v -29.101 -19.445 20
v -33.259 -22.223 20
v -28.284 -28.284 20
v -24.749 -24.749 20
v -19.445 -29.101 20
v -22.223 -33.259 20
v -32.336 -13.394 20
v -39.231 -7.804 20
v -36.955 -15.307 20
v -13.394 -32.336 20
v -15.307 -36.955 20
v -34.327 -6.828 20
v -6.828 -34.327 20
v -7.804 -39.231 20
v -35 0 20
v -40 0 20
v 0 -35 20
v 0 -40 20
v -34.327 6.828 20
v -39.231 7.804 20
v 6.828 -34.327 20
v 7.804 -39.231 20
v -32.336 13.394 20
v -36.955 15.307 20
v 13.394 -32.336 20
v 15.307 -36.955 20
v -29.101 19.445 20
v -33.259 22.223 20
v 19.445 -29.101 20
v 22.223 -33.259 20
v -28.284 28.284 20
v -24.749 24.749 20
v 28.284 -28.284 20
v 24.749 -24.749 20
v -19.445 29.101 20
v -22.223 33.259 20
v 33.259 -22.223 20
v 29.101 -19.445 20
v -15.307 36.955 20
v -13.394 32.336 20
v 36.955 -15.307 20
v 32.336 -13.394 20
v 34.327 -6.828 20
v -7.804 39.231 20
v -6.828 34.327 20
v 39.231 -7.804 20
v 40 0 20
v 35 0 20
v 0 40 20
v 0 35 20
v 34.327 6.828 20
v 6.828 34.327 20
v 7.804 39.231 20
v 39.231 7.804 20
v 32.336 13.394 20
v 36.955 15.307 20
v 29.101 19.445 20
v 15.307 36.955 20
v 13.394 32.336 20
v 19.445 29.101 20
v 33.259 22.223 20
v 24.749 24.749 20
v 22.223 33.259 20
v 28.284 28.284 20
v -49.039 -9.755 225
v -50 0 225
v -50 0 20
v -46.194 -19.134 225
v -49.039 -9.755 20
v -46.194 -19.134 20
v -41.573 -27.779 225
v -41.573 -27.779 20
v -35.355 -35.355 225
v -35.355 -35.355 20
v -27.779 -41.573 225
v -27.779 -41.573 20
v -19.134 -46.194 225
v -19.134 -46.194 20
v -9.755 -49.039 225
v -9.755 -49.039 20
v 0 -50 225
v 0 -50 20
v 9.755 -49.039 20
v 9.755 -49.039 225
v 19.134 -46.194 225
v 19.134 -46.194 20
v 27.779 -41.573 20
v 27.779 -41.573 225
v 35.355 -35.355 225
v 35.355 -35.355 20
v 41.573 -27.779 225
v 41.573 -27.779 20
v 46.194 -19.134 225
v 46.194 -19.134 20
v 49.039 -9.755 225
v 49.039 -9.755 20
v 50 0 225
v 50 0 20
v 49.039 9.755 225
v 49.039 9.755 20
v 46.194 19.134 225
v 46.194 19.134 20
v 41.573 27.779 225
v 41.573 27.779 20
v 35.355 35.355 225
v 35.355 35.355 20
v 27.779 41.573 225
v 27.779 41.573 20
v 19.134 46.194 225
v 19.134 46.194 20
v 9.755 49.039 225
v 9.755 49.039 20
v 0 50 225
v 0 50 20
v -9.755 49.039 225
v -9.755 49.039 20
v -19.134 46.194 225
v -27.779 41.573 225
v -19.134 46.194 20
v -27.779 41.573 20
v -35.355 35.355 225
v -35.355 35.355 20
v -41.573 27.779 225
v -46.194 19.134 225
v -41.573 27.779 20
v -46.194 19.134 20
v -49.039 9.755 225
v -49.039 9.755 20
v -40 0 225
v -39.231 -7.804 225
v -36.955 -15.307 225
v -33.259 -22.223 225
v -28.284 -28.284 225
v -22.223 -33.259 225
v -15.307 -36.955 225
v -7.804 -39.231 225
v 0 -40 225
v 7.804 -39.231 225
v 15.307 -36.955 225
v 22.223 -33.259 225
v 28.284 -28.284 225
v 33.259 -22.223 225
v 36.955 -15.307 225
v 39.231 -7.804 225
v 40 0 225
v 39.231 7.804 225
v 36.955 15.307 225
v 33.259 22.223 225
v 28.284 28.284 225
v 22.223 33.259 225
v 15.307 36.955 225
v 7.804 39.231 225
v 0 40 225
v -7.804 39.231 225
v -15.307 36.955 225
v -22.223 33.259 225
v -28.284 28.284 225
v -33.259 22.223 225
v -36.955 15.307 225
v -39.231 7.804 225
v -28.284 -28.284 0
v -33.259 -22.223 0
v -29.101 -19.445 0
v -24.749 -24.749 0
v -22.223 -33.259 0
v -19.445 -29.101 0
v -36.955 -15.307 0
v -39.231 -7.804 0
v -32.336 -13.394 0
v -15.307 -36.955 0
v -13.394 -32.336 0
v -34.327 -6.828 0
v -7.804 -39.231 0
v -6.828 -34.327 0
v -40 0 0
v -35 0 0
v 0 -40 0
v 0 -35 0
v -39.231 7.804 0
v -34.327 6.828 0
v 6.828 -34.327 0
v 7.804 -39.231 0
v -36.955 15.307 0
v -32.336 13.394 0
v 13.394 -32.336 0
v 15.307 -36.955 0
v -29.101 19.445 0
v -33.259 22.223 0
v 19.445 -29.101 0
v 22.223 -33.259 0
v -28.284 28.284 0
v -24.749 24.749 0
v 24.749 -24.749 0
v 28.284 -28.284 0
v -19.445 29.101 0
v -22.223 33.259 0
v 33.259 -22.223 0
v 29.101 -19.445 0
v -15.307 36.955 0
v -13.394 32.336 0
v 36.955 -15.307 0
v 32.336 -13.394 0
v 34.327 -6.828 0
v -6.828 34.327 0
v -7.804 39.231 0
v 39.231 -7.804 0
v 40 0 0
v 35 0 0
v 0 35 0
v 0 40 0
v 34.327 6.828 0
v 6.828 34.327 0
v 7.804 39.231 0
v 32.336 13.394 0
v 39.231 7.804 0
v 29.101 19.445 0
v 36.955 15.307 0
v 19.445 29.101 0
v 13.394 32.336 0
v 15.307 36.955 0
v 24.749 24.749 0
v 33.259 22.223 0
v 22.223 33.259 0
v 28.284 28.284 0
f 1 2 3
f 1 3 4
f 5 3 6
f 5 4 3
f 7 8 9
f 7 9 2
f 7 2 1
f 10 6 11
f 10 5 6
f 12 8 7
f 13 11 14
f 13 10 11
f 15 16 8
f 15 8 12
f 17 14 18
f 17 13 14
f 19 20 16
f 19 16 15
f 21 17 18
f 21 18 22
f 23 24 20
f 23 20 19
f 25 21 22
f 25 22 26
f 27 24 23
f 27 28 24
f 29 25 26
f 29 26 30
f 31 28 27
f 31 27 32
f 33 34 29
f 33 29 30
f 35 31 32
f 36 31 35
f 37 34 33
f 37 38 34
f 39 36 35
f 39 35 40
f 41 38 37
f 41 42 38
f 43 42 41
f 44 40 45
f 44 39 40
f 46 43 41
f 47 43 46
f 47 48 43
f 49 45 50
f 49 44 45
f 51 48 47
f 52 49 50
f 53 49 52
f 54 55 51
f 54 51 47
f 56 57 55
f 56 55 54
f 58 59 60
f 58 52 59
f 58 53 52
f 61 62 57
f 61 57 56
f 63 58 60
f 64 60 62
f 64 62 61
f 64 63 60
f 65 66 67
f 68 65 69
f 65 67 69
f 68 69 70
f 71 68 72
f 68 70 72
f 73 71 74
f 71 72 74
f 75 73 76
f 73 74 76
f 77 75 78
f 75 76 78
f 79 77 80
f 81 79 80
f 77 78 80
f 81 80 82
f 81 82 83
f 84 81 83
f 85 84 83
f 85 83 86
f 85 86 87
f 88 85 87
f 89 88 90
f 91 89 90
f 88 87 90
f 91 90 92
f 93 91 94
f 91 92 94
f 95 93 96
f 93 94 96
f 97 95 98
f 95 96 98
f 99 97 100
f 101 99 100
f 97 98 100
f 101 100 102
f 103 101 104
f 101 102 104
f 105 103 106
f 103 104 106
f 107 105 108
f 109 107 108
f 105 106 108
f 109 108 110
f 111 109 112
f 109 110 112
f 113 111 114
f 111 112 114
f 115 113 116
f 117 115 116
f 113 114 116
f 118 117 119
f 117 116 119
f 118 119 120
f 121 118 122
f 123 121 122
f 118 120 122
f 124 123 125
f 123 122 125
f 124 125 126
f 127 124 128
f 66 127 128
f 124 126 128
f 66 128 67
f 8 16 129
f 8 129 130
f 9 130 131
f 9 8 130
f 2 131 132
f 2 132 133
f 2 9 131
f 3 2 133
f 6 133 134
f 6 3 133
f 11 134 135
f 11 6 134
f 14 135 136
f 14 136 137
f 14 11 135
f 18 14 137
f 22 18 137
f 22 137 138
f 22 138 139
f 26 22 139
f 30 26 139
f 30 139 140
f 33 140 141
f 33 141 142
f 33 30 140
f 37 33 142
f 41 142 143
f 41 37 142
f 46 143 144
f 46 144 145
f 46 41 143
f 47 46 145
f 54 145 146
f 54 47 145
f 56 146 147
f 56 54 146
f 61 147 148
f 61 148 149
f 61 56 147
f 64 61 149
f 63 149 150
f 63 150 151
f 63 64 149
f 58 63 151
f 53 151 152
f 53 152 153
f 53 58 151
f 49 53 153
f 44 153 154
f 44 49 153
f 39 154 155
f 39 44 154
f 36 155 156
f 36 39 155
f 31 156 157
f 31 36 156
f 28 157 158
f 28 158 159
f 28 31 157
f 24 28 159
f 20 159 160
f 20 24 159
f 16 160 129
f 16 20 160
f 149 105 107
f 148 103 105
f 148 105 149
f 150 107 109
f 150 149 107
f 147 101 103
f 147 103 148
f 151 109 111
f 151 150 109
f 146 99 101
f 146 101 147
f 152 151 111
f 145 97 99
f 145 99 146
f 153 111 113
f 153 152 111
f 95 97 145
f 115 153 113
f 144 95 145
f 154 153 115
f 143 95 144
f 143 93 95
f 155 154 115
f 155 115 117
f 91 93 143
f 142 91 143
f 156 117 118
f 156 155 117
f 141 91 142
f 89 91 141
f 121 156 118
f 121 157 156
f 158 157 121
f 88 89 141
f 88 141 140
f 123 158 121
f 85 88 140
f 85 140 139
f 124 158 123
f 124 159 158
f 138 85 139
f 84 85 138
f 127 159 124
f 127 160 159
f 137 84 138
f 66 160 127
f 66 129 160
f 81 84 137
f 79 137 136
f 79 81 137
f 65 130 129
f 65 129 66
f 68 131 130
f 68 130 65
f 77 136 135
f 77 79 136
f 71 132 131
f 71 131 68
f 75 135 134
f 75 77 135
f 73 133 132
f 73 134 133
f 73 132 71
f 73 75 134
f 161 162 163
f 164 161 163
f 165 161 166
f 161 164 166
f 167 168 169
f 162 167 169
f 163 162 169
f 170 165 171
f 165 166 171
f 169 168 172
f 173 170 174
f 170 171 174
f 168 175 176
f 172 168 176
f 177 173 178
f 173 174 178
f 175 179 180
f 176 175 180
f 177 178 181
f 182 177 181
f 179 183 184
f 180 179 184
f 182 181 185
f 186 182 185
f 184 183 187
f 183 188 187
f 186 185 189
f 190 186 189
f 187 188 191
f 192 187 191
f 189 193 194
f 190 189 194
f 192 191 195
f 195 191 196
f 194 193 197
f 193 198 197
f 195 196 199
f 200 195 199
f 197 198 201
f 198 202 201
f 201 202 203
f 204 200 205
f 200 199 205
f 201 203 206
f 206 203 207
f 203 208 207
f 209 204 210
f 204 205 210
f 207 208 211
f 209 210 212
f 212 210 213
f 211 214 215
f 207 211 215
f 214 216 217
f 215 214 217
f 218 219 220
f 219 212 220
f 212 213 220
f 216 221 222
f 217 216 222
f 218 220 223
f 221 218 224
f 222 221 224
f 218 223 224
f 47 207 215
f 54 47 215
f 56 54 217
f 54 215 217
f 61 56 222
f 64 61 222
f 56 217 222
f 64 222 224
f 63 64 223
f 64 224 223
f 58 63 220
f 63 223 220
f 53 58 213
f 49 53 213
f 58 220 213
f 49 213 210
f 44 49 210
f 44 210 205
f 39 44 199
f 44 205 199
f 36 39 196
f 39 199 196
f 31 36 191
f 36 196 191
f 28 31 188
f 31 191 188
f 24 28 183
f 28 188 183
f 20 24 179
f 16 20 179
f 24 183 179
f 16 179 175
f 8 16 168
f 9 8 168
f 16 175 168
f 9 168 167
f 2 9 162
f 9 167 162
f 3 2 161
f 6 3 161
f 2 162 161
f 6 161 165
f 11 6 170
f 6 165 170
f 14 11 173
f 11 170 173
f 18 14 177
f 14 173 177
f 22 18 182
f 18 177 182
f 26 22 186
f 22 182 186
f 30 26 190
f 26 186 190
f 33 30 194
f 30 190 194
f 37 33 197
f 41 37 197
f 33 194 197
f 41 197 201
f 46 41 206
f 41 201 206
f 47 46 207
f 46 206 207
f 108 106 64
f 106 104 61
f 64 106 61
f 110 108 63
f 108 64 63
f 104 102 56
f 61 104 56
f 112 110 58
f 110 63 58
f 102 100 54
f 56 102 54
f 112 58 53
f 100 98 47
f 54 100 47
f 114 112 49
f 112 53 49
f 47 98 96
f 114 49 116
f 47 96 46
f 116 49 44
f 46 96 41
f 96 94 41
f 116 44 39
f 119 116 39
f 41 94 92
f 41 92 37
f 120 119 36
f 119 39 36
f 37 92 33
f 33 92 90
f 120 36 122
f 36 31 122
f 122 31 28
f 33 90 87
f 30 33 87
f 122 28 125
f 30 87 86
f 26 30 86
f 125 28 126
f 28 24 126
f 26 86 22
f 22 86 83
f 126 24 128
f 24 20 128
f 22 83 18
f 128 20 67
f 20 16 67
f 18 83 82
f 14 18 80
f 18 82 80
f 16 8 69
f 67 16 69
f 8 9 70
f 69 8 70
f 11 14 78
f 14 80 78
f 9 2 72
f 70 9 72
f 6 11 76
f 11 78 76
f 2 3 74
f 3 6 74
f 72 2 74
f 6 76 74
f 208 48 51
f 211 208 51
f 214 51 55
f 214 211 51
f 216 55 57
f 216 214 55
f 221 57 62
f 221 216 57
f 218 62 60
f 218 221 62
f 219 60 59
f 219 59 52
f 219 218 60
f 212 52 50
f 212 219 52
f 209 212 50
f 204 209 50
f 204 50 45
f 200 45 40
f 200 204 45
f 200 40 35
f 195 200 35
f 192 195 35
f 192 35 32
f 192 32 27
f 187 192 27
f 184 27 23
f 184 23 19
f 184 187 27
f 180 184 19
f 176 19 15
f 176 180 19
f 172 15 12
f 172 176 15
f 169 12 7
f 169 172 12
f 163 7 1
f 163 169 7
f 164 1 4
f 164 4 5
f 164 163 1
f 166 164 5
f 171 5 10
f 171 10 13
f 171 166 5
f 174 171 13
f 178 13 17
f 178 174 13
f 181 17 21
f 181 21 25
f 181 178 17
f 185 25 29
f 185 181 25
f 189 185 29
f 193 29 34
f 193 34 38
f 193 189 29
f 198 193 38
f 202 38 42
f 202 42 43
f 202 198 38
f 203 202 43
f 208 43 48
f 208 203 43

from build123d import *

# Parameters (mm, degrees)
SKETCH_1_R      = 40
SKETCH_1_R_2    = 35
EXTRUDE_1_DEPTH = 20
SKETCH_2_R      = 50
SKETCH_2_R_2    = 40
EXTRUDE_3_DEPTH = 205


with BuildPart() as part:
    # 草图1 → 凸台-拉伸1 (new body)
    with BuildSketch(Plane.XY):
        Circle(SKETCH_1_R)
        Circle(SKETCH_1_R_2, mode=Mode.SUBTRACT)
    extrude(amount=EXTRUDE_1_DEPTH)


with BuildPart() as body_2:
    # 草图2 → 凸台-拉伸3 (new body)
    with BuildSketch(Plane.XY.offset(20)):
        with Locations(Location((0, 0, 0), (0, 0, 180))):
            Circle(SKETCH_2_R)
        with Locations(Location((0, 0, 0), (0, 0, 180))):
            Circle(SKETCH_2_R_2, mode=Mode.SUBTRACT)
    extrude(amount=EXTRUDE_3_DEPTH)


solid = Compound([part.part, body_2.part])
